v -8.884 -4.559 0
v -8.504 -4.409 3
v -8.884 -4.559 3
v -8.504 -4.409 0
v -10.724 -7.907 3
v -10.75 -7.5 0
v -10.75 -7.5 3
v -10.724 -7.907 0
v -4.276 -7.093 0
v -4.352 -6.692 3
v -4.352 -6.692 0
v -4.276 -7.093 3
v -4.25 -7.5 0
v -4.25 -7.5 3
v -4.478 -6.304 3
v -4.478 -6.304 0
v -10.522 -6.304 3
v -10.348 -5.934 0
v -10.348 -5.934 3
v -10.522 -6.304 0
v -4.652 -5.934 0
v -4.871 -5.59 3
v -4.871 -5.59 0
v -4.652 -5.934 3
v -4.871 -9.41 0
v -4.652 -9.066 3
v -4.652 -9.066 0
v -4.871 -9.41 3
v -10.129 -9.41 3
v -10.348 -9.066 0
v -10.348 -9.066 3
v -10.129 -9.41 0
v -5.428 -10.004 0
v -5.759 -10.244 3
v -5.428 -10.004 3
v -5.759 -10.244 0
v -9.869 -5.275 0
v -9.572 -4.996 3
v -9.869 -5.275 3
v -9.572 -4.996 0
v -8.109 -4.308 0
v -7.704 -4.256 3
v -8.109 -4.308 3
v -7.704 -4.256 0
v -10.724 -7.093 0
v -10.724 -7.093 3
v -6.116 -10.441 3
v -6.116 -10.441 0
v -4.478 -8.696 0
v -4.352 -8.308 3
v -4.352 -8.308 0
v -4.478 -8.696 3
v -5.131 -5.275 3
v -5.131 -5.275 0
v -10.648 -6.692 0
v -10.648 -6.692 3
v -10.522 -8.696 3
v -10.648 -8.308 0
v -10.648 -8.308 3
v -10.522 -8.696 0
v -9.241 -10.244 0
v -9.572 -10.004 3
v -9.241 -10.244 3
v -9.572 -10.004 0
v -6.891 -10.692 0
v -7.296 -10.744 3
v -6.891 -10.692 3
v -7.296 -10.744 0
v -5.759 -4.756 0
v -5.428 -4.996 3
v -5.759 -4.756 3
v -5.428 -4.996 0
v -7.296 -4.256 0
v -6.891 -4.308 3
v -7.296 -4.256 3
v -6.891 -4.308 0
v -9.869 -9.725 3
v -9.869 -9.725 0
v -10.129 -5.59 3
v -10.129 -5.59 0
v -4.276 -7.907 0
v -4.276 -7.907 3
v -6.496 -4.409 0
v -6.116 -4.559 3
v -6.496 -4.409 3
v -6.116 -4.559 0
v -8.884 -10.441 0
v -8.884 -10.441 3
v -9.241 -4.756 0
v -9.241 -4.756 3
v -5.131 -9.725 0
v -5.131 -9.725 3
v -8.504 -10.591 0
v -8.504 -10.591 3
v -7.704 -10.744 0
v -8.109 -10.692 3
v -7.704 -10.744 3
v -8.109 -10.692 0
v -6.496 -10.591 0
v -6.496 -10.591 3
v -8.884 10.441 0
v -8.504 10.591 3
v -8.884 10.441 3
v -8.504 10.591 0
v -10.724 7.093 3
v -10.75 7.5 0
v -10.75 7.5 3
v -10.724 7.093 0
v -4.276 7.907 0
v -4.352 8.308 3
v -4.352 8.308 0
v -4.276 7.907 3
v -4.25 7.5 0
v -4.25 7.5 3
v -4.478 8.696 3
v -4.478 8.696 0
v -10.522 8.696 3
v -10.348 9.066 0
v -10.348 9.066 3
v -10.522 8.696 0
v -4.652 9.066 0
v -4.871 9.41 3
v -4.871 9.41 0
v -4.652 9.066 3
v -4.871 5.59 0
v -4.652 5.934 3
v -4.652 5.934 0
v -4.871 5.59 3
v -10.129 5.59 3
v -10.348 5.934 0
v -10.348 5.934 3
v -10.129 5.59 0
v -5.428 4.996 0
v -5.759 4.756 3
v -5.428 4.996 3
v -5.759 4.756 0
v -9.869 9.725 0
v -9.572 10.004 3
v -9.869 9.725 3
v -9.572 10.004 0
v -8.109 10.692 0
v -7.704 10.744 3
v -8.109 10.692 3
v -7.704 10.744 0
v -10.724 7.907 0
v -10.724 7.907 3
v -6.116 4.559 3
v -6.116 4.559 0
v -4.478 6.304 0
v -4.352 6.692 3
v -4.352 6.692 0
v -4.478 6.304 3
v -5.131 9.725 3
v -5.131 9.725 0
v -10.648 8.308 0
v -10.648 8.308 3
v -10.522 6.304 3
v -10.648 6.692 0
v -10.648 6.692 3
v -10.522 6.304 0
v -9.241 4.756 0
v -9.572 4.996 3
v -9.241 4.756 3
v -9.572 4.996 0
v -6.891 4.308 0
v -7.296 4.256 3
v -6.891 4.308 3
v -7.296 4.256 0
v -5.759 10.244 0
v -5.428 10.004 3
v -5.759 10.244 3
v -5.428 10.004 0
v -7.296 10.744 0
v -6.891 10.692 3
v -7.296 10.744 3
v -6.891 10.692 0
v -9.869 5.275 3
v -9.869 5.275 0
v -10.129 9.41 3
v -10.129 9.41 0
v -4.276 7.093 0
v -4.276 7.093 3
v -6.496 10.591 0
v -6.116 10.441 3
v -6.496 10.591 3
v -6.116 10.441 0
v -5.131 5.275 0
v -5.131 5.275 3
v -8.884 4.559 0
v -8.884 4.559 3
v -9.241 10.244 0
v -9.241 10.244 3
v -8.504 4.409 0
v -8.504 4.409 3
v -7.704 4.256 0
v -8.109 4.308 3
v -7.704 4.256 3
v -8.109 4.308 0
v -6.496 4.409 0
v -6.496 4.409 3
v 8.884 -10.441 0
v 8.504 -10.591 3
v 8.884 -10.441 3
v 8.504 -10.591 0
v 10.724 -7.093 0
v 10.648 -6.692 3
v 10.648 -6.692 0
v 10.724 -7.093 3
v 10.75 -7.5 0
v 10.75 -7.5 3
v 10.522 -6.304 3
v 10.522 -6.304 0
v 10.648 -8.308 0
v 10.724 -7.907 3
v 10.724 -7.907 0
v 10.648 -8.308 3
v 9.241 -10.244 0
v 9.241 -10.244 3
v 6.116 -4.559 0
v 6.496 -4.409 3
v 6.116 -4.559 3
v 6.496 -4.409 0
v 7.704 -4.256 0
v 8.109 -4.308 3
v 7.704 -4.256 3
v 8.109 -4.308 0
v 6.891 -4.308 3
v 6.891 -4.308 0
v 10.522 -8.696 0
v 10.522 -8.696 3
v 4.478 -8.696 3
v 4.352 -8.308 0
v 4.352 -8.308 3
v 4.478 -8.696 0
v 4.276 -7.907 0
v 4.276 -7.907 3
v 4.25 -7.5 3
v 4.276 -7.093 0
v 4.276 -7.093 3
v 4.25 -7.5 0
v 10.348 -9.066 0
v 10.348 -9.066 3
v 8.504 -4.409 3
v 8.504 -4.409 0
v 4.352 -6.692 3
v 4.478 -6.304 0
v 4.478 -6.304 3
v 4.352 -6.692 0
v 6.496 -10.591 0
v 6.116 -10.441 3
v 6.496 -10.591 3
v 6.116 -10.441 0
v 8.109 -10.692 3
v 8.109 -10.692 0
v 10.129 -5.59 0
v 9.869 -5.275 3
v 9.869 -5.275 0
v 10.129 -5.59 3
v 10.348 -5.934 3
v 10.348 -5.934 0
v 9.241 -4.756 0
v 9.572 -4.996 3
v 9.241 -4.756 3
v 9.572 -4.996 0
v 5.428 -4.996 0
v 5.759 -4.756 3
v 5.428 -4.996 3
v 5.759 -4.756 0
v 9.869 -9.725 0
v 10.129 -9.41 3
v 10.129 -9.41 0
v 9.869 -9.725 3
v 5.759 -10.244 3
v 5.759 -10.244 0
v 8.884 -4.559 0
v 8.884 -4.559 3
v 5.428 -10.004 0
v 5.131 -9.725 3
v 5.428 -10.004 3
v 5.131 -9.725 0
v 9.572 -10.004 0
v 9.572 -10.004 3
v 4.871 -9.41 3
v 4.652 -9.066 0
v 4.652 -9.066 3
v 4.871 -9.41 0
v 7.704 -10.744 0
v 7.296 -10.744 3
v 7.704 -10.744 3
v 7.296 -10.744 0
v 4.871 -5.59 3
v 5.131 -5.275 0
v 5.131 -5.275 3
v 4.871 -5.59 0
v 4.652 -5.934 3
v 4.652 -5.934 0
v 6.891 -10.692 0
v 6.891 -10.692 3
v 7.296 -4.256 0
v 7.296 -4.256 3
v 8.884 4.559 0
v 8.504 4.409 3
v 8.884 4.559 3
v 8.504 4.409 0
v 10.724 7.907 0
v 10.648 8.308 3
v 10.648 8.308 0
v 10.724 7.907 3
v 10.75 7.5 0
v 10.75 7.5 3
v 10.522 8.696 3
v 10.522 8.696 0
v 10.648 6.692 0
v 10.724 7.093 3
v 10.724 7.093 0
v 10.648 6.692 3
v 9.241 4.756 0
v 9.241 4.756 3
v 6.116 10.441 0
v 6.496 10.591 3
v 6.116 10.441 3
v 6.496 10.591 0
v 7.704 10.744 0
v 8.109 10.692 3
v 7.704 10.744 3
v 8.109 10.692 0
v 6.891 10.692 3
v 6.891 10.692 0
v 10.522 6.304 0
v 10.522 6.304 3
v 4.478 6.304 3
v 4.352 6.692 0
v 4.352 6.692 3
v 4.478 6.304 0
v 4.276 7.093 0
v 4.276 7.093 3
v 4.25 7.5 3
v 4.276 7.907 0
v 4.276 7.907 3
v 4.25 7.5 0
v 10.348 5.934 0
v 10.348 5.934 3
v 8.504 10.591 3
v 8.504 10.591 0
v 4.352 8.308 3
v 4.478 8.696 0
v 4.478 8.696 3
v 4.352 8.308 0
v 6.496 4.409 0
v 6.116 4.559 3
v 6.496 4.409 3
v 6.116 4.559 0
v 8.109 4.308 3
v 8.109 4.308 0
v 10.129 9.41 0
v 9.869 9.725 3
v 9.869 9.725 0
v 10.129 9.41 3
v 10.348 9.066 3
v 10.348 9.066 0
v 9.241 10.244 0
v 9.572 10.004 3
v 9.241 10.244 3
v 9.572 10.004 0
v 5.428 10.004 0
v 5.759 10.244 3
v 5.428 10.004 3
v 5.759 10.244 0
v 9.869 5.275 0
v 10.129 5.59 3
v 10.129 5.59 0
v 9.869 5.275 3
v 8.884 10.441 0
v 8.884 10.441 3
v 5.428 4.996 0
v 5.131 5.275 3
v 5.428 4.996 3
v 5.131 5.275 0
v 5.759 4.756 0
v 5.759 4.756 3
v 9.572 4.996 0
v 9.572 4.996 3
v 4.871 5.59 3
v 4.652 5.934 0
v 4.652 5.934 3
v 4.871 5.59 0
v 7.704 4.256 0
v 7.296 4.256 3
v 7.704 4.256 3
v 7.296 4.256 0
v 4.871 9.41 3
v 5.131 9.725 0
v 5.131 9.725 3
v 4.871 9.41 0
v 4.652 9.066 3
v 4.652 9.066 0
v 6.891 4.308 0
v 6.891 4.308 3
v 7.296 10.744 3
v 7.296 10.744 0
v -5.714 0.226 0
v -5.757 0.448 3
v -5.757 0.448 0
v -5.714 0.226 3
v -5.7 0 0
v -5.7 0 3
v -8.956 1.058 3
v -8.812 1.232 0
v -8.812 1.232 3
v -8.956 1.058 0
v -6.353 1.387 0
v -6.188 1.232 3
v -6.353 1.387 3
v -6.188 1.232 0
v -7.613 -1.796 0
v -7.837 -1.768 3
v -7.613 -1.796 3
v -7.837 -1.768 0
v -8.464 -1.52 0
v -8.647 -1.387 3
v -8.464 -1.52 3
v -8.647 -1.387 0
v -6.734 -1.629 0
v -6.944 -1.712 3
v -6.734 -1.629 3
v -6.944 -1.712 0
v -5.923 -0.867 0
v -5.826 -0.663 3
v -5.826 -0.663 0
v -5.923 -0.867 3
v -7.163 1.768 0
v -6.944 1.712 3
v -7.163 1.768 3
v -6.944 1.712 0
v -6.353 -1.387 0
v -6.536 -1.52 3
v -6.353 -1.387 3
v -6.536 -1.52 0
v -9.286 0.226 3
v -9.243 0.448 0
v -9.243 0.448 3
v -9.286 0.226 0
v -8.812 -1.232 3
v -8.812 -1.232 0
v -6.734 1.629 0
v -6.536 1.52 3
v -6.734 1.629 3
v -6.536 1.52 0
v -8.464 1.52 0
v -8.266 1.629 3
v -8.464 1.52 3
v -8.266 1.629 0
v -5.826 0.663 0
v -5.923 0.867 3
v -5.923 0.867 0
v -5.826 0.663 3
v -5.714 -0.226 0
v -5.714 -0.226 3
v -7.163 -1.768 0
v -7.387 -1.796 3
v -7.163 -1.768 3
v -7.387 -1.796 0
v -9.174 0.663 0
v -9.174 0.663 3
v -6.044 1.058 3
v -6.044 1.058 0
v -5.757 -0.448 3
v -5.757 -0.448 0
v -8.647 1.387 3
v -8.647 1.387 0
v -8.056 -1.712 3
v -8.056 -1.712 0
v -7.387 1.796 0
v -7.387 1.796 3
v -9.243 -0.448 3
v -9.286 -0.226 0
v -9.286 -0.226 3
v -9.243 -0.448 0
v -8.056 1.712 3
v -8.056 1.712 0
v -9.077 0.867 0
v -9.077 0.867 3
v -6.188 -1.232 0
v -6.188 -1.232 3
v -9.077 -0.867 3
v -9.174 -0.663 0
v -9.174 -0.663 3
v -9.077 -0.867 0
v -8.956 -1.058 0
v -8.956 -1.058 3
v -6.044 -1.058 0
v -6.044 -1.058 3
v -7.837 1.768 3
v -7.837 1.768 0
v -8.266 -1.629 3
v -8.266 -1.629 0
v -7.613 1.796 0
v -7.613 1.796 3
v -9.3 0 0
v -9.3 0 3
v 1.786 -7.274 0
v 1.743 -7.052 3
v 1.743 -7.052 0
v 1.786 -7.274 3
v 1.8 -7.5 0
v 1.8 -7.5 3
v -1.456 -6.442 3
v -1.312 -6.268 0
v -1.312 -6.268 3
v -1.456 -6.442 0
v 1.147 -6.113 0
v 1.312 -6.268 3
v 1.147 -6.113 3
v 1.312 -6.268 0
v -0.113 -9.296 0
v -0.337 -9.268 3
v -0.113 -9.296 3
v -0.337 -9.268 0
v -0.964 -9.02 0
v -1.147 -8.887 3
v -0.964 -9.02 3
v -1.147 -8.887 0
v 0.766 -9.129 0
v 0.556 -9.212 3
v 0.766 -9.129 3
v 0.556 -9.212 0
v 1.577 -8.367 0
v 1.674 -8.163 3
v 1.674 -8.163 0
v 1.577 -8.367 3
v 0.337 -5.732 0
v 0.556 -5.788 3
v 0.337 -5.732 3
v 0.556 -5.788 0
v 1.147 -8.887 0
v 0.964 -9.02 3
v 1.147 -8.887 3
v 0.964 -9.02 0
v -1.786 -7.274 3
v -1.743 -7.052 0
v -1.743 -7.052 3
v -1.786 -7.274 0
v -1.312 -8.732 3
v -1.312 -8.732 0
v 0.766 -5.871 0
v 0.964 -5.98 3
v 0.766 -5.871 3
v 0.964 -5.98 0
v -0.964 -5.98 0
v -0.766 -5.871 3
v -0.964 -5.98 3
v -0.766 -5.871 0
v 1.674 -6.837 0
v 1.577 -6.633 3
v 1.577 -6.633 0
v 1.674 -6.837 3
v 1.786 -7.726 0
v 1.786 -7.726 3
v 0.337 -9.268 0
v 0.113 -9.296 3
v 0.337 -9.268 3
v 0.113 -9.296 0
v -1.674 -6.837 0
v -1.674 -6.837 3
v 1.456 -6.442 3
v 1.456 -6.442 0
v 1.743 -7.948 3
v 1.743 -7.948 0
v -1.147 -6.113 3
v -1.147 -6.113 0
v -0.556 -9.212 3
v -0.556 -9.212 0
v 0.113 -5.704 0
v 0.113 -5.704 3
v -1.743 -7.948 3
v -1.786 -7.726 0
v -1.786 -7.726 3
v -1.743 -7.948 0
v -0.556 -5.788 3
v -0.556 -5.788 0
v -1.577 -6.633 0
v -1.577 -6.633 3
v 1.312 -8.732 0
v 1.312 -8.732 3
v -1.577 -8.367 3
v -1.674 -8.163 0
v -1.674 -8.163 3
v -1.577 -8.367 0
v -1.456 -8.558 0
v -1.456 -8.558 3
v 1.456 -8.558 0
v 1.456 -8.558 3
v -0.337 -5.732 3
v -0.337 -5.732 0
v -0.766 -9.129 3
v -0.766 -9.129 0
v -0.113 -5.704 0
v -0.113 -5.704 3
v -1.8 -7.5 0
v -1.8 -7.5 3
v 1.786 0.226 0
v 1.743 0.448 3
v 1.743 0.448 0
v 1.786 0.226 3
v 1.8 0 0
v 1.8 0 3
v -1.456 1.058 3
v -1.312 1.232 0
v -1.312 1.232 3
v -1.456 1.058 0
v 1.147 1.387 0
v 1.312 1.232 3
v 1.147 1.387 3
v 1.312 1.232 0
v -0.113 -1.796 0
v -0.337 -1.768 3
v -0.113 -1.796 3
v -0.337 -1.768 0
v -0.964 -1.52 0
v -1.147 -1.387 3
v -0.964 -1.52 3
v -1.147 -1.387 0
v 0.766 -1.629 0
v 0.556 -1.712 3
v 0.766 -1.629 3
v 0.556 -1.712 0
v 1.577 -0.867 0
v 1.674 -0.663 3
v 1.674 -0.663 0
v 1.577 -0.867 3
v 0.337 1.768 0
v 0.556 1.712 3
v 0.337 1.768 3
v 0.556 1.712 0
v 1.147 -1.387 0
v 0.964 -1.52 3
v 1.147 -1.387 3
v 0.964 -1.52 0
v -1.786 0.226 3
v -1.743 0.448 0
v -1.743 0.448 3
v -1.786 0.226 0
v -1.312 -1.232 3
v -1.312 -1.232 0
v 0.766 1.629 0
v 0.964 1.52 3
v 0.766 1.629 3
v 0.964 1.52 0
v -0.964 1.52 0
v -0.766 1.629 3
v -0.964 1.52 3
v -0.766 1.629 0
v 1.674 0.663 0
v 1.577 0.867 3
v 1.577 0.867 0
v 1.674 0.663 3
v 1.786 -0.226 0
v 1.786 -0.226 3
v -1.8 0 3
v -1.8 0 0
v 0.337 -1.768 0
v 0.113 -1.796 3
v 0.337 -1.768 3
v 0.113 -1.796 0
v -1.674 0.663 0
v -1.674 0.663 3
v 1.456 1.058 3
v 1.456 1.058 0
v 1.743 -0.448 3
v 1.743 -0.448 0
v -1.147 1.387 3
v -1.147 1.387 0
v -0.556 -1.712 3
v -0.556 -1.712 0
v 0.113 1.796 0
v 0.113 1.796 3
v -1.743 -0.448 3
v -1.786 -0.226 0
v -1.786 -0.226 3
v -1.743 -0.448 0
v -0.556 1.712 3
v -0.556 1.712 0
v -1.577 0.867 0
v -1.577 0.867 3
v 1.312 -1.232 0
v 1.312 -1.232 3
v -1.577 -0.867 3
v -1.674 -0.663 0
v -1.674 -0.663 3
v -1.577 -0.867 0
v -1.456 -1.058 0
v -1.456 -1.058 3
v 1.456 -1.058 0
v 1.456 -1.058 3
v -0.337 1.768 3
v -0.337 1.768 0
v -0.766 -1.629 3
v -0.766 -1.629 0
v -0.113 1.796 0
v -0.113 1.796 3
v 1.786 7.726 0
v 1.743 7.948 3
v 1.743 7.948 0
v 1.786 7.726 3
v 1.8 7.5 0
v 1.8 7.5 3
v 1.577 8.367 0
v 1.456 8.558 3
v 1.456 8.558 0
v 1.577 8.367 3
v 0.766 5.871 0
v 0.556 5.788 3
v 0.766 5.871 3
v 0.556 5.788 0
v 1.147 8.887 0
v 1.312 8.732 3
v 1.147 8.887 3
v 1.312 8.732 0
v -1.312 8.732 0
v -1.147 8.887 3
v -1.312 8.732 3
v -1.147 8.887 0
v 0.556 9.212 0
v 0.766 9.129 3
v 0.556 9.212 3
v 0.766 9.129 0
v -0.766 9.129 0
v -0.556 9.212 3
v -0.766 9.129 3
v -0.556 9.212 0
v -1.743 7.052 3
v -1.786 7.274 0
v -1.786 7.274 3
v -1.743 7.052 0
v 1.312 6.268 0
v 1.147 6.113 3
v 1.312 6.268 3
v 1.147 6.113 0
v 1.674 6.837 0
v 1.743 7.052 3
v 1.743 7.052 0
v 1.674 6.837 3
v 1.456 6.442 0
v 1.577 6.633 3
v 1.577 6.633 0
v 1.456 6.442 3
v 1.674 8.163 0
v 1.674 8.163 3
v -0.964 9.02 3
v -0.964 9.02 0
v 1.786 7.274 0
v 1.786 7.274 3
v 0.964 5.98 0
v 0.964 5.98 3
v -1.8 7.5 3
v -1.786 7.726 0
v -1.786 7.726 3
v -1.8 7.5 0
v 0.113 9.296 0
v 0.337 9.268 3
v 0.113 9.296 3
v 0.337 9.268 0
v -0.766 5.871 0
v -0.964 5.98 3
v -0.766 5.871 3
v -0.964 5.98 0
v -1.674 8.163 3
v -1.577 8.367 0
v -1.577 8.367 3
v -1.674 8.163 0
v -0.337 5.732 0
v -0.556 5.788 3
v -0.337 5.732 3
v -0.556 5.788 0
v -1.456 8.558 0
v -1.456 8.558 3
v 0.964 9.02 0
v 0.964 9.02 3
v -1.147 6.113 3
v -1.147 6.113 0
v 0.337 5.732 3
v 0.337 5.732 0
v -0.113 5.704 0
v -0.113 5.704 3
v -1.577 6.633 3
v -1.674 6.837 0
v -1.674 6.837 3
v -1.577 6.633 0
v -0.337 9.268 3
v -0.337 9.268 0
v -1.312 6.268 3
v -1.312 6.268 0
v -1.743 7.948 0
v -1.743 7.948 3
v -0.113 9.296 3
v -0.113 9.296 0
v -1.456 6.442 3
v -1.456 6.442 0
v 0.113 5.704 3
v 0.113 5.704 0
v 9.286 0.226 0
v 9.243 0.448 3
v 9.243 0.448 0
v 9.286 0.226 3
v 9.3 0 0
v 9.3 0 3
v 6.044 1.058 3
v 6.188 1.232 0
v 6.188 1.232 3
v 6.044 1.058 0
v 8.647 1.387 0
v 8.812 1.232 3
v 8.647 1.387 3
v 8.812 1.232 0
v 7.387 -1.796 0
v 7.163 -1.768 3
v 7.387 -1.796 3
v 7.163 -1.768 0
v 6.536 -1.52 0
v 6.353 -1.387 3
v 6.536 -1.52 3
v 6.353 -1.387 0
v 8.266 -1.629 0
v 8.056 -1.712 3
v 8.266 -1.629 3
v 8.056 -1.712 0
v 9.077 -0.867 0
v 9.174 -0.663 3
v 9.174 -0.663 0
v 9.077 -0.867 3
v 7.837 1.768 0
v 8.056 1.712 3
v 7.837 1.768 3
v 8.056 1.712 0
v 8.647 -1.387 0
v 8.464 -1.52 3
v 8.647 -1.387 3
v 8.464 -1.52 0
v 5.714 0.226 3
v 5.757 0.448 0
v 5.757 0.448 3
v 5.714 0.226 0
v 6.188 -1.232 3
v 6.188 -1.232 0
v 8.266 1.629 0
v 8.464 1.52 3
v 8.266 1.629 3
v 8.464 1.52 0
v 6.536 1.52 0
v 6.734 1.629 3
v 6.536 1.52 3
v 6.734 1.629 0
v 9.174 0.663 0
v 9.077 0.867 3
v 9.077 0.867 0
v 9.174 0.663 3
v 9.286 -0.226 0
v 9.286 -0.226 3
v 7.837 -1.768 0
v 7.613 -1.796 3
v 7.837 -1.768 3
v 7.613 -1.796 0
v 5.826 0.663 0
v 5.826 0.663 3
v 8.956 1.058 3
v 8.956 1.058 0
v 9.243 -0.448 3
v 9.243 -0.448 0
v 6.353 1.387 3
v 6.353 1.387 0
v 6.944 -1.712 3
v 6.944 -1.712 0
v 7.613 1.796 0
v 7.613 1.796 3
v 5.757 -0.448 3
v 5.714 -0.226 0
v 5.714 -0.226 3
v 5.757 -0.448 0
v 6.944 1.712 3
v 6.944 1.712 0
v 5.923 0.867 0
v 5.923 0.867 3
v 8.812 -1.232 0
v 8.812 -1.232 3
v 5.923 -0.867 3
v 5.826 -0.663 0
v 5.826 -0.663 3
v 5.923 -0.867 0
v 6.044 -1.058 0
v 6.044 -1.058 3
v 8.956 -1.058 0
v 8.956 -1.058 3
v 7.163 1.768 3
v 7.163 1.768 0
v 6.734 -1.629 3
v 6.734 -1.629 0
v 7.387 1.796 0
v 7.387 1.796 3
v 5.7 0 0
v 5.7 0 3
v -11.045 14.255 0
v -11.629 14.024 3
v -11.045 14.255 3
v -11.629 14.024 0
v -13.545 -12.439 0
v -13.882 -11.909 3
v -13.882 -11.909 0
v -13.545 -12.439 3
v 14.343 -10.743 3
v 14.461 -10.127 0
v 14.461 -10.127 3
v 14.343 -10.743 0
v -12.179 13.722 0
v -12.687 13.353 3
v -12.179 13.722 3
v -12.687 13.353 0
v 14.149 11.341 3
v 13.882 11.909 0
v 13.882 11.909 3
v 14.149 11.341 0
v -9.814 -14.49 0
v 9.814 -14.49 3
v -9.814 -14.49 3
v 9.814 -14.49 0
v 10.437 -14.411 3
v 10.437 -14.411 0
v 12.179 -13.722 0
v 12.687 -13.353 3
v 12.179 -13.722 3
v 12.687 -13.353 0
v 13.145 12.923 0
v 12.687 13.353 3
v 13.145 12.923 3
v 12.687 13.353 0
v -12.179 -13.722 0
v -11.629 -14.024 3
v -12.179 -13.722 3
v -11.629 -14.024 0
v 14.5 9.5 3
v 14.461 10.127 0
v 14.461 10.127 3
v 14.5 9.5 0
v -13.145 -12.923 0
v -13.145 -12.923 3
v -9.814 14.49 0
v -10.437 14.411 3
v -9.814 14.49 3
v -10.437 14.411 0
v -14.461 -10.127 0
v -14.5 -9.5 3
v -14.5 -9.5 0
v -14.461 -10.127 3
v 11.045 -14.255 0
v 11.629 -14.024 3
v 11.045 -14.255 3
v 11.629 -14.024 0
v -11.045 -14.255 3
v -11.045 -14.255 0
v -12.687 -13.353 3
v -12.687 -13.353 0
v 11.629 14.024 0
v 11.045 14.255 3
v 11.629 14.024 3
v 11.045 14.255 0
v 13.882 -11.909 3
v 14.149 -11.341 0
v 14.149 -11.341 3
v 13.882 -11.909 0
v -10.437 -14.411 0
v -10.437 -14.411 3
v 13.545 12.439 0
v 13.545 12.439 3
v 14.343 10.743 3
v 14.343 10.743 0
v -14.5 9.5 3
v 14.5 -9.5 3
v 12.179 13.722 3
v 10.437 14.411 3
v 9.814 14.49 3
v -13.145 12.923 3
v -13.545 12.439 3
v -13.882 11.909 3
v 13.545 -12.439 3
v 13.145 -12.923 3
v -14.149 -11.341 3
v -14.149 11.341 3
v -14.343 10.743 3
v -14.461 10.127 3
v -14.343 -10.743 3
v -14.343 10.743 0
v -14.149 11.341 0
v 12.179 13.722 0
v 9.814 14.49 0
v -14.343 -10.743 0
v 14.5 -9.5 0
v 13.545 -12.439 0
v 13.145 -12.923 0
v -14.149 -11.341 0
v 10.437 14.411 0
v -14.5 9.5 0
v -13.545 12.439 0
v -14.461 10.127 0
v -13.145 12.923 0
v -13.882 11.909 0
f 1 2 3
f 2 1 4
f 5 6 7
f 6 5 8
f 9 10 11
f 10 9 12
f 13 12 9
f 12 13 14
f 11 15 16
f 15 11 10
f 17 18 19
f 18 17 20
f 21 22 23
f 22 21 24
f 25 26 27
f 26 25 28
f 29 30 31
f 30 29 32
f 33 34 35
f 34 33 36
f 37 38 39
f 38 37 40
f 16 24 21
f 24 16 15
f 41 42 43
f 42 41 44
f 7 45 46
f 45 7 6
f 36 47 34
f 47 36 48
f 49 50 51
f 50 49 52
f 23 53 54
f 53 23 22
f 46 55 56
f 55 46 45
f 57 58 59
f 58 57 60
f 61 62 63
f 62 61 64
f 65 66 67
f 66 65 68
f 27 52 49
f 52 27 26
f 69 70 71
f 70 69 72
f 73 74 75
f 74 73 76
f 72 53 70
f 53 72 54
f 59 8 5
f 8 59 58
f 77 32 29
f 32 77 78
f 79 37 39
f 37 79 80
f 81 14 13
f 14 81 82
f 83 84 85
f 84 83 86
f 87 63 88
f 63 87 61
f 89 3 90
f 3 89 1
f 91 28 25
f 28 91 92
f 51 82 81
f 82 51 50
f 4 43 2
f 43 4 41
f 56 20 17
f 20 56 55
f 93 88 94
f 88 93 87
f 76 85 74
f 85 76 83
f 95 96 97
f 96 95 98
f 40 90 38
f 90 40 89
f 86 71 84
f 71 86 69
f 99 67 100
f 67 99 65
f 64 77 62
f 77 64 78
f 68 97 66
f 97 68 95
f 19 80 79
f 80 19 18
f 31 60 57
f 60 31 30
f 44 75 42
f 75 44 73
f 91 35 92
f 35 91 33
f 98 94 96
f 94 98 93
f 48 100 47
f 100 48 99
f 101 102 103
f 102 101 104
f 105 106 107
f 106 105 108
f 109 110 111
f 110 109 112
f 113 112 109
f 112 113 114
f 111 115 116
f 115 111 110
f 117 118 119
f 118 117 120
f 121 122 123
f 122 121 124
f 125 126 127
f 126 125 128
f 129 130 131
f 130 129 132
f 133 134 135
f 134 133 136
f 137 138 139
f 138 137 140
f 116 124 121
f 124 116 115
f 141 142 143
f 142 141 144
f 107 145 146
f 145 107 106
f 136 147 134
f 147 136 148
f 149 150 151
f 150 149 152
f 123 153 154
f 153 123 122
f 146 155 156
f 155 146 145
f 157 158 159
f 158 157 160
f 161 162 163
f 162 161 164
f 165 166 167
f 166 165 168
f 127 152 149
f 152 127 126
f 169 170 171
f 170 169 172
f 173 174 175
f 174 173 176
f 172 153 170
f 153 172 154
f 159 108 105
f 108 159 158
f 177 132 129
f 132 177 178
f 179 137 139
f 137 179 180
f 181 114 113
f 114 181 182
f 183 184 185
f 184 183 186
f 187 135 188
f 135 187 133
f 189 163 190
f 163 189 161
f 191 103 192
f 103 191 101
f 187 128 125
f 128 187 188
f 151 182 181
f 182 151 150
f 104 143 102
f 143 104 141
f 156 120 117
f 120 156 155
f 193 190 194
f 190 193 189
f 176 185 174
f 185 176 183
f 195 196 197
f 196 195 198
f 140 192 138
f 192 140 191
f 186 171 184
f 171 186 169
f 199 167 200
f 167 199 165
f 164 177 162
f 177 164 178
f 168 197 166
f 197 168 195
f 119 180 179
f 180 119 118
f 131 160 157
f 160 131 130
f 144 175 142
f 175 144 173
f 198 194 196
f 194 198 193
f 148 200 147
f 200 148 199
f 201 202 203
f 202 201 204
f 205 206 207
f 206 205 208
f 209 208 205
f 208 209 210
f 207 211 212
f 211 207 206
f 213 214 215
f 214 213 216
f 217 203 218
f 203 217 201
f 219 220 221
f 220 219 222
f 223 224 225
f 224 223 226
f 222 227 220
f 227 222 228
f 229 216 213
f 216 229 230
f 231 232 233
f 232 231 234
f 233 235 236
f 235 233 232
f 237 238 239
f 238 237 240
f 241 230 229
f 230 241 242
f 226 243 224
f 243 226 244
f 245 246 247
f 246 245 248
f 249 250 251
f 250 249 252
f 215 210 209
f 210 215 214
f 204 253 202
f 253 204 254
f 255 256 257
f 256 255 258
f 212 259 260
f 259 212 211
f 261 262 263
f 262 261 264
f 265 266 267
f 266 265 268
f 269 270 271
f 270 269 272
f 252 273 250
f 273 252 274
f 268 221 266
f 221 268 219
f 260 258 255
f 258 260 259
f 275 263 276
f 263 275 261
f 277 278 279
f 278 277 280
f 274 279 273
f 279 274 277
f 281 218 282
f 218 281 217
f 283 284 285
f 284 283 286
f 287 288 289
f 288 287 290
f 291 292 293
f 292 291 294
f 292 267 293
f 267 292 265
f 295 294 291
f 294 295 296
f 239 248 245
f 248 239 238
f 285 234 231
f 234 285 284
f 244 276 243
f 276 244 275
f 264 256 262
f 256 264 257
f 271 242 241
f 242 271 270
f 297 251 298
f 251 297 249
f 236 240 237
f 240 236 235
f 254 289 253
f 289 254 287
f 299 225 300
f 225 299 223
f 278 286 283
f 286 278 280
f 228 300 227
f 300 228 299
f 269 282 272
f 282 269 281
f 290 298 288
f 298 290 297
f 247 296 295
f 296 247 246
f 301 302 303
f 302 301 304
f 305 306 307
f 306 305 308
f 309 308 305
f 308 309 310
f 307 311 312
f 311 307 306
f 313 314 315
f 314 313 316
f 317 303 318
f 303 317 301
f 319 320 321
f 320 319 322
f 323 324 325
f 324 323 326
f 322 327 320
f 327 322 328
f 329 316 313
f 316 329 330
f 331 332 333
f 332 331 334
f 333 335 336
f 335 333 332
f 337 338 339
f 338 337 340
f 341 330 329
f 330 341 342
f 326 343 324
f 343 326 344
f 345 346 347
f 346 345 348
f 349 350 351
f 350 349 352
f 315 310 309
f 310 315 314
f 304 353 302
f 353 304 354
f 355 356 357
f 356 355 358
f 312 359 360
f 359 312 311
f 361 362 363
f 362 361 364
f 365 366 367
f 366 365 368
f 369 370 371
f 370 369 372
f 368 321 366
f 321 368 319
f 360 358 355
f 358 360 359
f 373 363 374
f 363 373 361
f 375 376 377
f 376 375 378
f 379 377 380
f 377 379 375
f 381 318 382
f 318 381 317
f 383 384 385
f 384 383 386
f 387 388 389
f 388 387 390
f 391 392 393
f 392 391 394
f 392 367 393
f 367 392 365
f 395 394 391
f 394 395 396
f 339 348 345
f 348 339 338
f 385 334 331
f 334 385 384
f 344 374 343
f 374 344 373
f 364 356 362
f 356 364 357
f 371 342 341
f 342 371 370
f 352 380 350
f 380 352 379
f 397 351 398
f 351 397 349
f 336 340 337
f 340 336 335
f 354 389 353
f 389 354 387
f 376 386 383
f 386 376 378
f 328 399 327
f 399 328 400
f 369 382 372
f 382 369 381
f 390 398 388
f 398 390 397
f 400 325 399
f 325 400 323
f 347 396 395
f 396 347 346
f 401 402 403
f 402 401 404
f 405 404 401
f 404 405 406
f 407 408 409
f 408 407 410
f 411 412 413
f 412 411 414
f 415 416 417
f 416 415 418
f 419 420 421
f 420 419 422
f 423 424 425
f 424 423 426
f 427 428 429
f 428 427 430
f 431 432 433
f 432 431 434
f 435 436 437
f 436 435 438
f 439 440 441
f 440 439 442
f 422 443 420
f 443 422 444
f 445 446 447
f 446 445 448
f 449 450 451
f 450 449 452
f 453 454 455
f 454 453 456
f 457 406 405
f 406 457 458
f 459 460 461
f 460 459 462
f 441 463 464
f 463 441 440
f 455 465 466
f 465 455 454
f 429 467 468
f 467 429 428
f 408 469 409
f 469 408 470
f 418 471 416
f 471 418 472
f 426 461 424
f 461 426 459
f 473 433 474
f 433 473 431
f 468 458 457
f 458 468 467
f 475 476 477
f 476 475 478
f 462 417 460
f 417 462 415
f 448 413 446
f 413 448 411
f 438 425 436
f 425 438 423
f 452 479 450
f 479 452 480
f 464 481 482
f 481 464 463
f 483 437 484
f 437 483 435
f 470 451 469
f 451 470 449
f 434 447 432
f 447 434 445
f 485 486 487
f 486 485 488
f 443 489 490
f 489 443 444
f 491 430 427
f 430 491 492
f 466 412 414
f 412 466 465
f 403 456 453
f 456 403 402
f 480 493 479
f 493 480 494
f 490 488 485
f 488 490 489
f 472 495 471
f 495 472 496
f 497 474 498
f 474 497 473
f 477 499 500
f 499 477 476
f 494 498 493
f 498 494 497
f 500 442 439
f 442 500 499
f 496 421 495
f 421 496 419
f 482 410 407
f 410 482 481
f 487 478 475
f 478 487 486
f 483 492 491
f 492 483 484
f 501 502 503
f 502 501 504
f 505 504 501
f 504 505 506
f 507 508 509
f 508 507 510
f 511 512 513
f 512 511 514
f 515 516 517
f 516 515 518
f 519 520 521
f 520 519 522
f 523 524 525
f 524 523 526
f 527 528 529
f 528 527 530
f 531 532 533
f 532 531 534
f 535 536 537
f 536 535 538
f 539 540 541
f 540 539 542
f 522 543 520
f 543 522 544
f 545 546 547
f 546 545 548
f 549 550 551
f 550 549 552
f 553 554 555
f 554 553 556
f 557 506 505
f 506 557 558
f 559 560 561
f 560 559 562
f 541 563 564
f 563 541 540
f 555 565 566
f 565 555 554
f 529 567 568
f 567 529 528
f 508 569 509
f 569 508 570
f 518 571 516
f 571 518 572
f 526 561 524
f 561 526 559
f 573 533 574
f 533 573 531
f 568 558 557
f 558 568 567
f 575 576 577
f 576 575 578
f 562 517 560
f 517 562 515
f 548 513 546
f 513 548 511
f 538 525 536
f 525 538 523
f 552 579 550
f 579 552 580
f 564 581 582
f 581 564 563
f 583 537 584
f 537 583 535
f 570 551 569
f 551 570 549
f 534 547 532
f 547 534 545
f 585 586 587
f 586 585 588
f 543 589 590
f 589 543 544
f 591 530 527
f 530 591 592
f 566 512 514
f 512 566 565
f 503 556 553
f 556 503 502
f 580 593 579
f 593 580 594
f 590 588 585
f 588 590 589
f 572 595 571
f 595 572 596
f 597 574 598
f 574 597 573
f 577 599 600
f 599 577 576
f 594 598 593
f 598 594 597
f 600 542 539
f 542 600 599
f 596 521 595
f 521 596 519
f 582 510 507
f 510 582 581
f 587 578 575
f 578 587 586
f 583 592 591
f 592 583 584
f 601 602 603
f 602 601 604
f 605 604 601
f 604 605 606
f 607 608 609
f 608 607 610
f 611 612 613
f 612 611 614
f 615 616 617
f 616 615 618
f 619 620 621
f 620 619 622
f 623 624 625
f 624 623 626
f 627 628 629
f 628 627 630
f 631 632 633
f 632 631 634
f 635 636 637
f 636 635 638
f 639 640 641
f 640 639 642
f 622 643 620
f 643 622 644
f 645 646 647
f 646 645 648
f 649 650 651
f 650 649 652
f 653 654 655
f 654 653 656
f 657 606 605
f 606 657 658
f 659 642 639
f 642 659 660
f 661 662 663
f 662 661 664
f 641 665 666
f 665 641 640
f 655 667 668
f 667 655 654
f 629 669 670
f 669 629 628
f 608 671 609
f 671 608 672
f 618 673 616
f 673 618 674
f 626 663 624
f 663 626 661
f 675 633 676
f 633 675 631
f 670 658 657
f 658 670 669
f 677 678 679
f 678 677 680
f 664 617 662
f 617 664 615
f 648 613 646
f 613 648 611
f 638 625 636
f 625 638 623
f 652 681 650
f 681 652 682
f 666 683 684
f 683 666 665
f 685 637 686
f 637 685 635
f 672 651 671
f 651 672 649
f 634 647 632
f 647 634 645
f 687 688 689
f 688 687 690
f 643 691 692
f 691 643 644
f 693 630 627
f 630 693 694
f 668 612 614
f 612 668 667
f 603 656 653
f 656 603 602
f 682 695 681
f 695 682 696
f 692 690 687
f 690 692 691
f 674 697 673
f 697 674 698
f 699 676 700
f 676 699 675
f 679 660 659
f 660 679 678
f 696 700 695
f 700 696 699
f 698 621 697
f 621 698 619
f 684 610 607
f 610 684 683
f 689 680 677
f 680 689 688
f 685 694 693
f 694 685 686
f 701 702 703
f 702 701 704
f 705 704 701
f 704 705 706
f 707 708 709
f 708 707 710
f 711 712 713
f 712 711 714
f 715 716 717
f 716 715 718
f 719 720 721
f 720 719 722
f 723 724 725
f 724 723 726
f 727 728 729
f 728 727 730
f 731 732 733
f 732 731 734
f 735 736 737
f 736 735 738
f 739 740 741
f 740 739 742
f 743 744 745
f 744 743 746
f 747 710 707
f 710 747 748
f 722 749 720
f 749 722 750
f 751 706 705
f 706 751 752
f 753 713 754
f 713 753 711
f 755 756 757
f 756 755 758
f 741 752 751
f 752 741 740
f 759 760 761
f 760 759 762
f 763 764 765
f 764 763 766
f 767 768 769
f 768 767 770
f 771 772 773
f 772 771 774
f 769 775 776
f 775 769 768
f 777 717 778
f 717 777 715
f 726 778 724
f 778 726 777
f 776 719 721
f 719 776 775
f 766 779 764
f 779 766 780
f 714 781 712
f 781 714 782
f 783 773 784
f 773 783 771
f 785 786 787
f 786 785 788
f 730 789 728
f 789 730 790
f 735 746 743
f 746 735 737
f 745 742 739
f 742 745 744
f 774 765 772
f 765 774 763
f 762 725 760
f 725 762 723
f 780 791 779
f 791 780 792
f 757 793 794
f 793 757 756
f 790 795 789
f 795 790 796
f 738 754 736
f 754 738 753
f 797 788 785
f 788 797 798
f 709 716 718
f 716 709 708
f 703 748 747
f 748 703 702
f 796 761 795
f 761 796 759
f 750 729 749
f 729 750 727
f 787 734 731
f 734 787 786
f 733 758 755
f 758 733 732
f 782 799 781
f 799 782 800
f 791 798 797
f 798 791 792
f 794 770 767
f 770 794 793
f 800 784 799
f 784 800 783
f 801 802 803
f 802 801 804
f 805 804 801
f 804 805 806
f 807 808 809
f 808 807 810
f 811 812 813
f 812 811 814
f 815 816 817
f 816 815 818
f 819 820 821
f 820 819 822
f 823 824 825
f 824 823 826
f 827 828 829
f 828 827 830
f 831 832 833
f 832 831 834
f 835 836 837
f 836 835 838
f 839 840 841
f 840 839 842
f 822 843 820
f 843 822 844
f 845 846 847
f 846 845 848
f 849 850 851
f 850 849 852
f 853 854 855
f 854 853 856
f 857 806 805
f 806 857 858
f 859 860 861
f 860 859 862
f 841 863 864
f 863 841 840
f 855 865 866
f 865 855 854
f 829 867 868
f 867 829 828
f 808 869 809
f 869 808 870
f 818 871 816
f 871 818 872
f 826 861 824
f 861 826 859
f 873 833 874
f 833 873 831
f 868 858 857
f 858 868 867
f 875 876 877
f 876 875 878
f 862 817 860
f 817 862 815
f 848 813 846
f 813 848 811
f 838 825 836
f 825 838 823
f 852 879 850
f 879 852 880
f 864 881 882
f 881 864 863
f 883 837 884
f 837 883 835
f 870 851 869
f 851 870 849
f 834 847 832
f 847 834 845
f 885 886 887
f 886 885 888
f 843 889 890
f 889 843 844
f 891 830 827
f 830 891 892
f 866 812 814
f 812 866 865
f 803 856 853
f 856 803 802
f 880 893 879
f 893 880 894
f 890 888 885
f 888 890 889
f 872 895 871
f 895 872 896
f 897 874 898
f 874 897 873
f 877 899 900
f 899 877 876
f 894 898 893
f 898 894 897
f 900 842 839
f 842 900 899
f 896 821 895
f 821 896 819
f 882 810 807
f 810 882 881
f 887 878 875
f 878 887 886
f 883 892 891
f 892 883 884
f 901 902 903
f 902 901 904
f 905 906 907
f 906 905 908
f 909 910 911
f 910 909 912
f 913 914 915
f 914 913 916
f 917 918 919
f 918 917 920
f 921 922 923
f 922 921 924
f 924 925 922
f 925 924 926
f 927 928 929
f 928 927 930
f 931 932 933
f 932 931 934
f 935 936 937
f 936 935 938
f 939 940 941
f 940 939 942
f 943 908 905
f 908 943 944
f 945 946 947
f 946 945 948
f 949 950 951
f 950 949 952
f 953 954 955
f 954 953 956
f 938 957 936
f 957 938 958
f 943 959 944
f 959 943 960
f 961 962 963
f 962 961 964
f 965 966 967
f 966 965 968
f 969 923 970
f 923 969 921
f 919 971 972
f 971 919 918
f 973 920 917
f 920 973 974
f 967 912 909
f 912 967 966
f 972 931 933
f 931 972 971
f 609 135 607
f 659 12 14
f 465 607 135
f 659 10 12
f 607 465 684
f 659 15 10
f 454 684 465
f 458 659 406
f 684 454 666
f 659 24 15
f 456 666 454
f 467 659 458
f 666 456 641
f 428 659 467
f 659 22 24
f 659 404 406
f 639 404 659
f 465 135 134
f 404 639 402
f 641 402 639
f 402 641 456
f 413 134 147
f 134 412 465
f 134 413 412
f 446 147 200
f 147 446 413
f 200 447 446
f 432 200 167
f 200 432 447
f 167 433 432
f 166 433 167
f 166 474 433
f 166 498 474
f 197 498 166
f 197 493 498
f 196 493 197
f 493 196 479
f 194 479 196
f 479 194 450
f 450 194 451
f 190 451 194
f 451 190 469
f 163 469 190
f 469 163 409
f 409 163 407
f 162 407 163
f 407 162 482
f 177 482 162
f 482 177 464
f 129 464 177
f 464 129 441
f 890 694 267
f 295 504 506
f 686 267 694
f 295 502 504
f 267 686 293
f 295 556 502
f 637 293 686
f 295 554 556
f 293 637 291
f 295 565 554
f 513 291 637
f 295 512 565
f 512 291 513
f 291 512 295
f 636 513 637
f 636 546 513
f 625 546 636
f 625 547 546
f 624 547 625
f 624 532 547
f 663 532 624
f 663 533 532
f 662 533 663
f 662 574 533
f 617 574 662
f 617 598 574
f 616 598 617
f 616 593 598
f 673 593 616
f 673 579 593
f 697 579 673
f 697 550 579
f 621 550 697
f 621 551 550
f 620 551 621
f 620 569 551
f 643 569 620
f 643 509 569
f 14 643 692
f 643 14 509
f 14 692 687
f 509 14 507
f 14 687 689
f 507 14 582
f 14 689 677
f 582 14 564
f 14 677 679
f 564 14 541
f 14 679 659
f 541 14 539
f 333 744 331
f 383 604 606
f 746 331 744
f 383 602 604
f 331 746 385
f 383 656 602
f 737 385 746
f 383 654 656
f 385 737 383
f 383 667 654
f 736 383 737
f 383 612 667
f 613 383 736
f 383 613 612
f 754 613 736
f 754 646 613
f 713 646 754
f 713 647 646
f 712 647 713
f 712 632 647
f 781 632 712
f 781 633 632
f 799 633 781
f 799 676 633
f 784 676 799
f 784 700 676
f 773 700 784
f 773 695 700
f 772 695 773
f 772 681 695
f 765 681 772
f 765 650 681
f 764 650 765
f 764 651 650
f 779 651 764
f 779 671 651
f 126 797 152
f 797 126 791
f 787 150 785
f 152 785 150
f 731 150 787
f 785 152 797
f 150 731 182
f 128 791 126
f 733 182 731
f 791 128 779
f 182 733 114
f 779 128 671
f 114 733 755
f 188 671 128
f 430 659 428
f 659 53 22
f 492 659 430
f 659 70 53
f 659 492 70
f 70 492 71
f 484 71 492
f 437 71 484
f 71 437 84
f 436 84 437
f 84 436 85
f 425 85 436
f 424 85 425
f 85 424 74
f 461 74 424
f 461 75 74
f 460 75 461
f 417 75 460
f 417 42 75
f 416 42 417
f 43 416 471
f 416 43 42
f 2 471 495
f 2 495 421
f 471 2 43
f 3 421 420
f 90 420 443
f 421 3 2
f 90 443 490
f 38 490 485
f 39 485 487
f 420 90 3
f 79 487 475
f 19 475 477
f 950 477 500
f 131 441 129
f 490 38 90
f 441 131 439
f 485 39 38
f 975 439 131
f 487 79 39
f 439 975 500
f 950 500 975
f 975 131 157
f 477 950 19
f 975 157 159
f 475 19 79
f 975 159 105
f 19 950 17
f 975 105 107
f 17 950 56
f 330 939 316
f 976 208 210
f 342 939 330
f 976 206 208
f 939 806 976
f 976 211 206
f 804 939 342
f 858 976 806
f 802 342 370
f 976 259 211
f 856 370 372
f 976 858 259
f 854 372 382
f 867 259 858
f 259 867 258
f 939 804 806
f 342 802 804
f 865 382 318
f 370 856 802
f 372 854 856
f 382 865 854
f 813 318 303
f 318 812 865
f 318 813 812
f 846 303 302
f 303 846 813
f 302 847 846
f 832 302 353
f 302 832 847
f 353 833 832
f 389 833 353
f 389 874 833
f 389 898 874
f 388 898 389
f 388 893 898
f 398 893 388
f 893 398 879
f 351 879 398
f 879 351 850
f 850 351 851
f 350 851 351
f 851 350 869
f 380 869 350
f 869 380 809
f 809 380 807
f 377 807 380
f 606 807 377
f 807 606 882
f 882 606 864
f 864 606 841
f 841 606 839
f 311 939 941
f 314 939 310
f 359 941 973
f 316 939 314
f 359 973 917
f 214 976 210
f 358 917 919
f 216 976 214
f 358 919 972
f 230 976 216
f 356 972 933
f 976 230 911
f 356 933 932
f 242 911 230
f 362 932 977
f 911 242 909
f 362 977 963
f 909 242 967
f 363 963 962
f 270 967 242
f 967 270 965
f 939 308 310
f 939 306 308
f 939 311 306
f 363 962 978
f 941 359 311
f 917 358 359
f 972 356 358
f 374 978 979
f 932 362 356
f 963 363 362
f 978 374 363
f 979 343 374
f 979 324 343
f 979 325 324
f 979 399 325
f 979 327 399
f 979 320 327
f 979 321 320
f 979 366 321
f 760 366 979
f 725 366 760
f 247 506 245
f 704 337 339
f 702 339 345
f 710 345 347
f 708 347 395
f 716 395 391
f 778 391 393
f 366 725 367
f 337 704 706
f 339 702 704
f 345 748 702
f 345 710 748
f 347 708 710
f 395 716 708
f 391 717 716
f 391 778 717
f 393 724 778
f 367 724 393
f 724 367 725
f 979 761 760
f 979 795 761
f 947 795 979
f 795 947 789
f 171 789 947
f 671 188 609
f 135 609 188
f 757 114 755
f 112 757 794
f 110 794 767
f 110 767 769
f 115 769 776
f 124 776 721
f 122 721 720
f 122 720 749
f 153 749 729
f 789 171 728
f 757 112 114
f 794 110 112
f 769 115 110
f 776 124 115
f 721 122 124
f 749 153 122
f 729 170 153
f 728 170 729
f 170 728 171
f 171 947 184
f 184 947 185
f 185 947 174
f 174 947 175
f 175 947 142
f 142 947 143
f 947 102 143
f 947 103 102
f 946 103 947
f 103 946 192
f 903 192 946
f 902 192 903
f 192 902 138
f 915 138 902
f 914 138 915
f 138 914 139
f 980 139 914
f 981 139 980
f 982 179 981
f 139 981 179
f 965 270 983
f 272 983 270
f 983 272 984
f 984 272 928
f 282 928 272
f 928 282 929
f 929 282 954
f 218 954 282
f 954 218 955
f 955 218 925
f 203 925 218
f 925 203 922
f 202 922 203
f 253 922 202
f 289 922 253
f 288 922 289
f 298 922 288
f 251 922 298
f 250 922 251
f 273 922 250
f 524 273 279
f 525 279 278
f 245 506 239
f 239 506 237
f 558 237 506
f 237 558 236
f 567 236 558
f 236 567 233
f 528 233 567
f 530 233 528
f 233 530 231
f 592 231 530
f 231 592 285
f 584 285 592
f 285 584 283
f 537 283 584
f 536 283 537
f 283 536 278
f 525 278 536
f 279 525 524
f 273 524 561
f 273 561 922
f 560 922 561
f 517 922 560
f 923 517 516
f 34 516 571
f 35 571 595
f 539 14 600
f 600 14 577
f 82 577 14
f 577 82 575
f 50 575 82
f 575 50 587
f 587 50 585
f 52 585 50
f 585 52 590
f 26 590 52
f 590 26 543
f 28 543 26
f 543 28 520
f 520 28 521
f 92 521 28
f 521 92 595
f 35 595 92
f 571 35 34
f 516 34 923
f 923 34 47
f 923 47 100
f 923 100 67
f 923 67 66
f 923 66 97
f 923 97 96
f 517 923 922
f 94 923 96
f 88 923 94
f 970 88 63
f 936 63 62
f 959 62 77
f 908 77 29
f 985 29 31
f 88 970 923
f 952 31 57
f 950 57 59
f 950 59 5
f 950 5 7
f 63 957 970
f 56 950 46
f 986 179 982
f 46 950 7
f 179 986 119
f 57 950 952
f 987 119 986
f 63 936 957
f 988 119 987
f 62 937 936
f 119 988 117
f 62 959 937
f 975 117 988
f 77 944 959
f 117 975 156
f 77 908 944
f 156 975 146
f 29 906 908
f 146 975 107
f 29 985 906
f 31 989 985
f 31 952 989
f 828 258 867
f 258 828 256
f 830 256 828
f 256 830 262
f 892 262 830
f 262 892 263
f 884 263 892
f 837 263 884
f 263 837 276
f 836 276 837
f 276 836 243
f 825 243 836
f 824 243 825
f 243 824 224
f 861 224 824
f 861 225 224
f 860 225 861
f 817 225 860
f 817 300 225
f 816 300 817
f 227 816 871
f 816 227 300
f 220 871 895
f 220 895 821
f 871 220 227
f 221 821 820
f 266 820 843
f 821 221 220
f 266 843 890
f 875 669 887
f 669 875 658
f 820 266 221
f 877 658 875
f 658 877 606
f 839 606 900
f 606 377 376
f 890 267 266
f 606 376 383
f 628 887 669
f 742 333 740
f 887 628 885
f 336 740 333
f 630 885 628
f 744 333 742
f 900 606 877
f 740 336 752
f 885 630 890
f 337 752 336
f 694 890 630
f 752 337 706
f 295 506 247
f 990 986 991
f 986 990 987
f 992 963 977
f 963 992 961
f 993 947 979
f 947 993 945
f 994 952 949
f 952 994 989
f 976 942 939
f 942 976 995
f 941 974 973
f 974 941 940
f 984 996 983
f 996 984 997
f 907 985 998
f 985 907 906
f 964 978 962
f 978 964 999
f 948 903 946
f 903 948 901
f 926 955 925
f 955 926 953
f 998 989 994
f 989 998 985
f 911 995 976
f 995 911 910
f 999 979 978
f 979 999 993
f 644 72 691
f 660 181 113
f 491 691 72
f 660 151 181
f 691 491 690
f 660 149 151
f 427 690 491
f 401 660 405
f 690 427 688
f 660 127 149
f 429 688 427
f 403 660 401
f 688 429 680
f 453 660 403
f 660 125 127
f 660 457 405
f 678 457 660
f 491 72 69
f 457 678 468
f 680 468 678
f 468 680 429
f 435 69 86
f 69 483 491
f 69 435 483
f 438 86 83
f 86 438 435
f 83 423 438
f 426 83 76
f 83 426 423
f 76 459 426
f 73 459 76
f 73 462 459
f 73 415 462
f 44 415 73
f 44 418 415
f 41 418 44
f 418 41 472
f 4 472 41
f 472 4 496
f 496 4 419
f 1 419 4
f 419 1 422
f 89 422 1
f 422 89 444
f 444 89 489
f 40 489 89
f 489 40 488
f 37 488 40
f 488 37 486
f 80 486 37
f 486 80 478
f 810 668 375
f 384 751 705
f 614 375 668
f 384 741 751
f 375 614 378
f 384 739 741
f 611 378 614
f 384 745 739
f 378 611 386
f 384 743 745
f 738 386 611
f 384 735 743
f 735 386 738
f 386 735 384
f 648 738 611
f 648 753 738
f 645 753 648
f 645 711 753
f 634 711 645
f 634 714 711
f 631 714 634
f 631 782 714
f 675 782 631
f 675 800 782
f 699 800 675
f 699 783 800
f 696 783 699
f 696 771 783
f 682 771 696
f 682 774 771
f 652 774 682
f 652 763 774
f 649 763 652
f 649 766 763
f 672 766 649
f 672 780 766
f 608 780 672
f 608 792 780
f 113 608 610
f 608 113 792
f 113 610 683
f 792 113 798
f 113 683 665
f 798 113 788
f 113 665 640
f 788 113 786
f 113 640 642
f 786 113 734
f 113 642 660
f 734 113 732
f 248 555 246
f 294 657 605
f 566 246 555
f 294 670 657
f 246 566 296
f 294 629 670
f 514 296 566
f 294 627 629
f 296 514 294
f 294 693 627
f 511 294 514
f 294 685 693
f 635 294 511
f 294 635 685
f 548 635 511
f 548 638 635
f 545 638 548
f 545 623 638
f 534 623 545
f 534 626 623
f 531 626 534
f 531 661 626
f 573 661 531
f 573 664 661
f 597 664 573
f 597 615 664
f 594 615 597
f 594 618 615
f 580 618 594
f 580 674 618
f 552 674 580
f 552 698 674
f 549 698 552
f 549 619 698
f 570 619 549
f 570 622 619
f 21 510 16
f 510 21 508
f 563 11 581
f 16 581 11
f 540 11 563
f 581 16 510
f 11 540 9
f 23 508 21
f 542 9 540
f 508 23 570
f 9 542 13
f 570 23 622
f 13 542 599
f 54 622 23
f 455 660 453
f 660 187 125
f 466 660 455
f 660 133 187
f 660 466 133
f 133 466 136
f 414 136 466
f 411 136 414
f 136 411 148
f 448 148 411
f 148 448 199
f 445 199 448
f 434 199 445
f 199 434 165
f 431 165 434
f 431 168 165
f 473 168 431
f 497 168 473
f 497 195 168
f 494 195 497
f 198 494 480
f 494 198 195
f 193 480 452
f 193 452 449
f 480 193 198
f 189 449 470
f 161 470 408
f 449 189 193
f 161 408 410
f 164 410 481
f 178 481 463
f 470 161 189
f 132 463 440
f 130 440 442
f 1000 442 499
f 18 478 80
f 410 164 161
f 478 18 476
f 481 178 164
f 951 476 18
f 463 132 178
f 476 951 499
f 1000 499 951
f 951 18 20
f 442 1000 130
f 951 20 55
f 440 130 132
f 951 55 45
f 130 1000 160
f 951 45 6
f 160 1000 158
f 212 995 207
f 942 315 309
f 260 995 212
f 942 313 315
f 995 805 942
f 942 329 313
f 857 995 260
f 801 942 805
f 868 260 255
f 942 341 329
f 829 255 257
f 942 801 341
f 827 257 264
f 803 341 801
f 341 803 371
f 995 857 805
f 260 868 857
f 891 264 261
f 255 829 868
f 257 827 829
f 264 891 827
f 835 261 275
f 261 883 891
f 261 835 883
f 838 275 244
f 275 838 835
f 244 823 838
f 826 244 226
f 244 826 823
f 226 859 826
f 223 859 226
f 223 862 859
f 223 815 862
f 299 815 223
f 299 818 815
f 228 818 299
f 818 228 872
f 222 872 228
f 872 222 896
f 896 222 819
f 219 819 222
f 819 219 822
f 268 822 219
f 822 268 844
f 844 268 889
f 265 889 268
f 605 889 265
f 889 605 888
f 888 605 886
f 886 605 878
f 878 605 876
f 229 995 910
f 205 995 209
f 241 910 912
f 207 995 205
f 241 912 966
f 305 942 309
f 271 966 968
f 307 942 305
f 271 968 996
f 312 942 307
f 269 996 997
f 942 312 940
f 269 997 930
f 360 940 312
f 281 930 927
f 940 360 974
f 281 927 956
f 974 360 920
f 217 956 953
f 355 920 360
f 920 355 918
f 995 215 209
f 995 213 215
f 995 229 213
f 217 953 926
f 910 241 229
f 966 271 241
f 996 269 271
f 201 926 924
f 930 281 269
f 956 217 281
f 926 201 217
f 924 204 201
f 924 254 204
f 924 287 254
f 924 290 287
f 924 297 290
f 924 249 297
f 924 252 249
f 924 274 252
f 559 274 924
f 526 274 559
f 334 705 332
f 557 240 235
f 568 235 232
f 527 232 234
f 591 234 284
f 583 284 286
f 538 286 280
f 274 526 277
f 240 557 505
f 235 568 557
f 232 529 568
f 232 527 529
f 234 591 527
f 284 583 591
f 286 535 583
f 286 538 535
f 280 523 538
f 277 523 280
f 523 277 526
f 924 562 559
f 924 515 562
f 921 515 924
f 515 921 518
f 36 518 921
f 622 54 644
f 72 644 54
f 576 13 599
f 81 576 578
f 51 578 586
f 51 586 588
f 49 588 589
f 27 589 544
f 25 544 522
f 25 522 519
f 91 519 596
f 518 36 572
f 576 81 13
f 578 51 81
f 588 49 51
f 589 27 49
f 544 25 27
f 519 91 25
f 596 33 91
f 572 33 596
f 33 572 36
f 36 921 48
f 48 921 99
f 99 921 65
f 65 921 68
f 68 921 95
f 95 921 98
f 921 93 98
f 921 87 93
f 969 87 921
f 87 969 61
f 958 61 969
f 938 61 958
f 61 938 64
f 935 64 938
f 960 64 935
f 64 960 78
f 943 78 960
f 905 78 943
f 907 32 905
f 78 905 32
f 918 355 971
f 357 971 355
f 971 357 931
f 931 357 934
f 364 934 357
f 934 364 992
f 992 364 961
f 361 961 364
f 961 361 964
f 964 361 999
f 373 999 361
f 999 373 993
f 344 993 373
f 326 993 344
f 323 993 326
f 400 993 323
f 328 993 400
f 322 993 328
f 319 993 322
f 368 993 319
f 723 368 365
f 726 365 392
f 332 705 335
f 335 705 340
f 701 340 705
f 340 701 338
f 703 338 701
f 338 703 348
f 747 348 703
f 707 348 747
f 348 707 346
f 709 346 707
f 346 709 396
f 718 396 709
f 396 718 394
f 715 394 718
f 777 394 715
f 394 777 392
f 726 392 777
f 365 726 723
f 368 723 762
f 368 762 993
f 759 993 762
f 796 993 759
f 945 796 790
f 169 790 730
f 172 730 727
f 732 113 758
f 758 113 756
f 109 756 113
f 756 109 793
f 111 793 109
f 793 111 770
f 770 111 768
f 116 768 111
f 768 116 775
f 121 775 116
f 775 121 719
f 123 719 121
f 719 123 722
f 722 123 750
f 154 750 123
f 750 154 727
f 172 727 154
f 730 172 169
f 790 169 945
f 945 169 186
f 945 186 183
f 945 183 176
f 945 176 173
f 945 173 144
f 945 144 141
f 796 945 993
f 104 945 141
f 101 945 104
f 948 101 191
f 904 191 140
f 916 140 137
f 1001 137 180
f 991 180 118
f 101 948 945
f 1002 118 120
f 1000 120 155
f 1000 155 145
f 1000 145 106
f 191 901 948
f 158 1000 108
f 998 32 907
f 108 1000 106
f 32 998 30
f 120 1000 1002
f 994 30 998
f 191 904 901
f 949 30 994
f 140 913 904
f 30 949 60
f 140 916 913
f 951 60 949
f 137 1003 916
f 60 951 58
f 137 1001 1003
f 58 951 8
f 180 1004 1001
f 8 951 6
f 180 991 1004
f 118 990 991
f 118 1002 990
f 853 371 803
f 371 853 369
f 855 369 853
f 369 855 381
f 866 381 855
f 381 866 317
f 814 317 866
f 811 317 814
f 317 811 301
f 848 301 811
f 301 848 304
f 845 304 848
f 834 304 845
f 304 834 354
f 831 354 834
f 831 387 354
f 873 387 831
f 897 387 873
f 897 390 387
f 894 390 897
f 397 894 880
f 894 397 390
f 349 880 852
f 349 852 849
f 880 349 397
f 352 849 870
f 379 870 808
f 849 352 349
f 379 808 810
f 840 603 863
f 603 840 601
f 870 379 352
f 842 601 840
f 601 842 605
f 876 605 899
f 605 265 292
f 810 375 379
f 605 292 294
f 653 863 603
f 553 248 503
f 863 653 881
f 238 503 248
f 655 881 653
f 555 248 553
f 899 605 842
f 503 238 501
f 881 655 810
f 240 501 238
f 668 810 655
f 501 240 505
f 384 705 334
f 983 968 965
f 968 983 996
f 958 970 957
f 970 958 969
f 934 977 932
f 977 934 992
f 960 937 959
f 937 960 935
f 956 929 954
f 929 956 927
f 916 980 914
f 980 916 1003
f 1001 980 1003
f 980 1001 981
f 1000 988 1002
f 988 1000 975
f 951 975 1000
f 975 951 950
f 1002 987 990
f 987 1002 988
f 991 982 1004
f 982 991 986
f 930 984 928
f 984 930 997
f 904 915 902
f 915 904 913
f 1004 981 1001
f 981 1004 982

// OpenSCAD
$fn = 50;


difference() {
	union() {
		hull() {
			translate(v = [-9.5000000000, 9.5000000000, 0]) {
				cylinder(h = 3, r = 5);
			}
			translate(v = [9.5000000000, 9.5000000000, 0]) {
				cylinder(h = 3, r = 5);
			}
			translate(v = [-9.5000000000, -9.5000000000, 0]) {
				cylinder(h = 3, r = 5);
			}
			translate(v = [9.5000000000, -9.5000000000, 0]) {
				cylinder(h = 3, r = 5);
			}
		}
	}
	union() {
		translate(v = [-7.5000000000, -7.5000000000, 0]) {
			translate(v = [0, 0, -100]) {
				cylinder(h = 200, r = 3.2500000000);
			}
		}
		translate(v = [-7.5000000000, 7.5000000000, 0]) {
			translate(v = [0, 0, -100]) {
				cylinder(h = 200, r = 3.2500000000);
			}
		}
		translate(v = [7.5000000000, -7.5000000000, 0]) {
			translate(v = [0, 0, -100]) {
				cylinder(h = 200, r = 3.2500000000);
			}
		}
		translate(v = [7.5000000000, 7.5000000000, 0]) {
			translate(v = [0, 0, -100]) {
				cylinder(h = 200, r = 3.2500000000);
			}
		}
		translate(v = [-7.5000000000, -7.5000000000, 0]) {
			translate(v = [0, 0, -100]) {
				cylinder(h = 200, r = 1.8000000000);
			}
		}
		translate(v = [-7.5000000000, 0.0000000000, 0]) {
			translate(v = [0, 0, -100]) {
				cylinder(h = 200, r = 1.8000000000);
			}
		}
		translate(v = [-7.5000000000, 7.5000000000, 0]) {
			translate(v = [0, 0, -100]) {
				cylinder(h = 200, r = 1.8000000000);
			}
		}
		translate(v = [0.0000000000, -7.5000000000, 0]) {
			translate(v = [0, 0, -100]) {
				cylinder(h = 200, r = 1.8000000000);
			}
		}
		translate(v = [0, 0, -100]) {
			cylinder(h = 200, r = 1.8000000000);
		}
		translate(v = [0.0000000000, 7.5000000000, 0]) {
			translate(v = [0, 0, -100]) {
				cylinder(h = 200, r = 1.8000000000);
			}
		}
		translate(v = [7.5000000000, -7.5000000000, 0]) {
			translate(v = [0, 0, -100]) {
				cylinder(h = 200, r = 1.8000000000);
			}
		}
		translate(v = [7.5000000000, 0.0000000000, 0]) {
			translate(v = [0, 0, -100]) {
				cylinder(h = 200, r = 1.8000000000);
			}
		}
		translate(v = [7.5000000000, 7.5000000000, 0]) {
			translate(v = [0, 0, -100]) {
				cylinder(h = 200, r = 1.8000000000);
			}
		}
	}
}
